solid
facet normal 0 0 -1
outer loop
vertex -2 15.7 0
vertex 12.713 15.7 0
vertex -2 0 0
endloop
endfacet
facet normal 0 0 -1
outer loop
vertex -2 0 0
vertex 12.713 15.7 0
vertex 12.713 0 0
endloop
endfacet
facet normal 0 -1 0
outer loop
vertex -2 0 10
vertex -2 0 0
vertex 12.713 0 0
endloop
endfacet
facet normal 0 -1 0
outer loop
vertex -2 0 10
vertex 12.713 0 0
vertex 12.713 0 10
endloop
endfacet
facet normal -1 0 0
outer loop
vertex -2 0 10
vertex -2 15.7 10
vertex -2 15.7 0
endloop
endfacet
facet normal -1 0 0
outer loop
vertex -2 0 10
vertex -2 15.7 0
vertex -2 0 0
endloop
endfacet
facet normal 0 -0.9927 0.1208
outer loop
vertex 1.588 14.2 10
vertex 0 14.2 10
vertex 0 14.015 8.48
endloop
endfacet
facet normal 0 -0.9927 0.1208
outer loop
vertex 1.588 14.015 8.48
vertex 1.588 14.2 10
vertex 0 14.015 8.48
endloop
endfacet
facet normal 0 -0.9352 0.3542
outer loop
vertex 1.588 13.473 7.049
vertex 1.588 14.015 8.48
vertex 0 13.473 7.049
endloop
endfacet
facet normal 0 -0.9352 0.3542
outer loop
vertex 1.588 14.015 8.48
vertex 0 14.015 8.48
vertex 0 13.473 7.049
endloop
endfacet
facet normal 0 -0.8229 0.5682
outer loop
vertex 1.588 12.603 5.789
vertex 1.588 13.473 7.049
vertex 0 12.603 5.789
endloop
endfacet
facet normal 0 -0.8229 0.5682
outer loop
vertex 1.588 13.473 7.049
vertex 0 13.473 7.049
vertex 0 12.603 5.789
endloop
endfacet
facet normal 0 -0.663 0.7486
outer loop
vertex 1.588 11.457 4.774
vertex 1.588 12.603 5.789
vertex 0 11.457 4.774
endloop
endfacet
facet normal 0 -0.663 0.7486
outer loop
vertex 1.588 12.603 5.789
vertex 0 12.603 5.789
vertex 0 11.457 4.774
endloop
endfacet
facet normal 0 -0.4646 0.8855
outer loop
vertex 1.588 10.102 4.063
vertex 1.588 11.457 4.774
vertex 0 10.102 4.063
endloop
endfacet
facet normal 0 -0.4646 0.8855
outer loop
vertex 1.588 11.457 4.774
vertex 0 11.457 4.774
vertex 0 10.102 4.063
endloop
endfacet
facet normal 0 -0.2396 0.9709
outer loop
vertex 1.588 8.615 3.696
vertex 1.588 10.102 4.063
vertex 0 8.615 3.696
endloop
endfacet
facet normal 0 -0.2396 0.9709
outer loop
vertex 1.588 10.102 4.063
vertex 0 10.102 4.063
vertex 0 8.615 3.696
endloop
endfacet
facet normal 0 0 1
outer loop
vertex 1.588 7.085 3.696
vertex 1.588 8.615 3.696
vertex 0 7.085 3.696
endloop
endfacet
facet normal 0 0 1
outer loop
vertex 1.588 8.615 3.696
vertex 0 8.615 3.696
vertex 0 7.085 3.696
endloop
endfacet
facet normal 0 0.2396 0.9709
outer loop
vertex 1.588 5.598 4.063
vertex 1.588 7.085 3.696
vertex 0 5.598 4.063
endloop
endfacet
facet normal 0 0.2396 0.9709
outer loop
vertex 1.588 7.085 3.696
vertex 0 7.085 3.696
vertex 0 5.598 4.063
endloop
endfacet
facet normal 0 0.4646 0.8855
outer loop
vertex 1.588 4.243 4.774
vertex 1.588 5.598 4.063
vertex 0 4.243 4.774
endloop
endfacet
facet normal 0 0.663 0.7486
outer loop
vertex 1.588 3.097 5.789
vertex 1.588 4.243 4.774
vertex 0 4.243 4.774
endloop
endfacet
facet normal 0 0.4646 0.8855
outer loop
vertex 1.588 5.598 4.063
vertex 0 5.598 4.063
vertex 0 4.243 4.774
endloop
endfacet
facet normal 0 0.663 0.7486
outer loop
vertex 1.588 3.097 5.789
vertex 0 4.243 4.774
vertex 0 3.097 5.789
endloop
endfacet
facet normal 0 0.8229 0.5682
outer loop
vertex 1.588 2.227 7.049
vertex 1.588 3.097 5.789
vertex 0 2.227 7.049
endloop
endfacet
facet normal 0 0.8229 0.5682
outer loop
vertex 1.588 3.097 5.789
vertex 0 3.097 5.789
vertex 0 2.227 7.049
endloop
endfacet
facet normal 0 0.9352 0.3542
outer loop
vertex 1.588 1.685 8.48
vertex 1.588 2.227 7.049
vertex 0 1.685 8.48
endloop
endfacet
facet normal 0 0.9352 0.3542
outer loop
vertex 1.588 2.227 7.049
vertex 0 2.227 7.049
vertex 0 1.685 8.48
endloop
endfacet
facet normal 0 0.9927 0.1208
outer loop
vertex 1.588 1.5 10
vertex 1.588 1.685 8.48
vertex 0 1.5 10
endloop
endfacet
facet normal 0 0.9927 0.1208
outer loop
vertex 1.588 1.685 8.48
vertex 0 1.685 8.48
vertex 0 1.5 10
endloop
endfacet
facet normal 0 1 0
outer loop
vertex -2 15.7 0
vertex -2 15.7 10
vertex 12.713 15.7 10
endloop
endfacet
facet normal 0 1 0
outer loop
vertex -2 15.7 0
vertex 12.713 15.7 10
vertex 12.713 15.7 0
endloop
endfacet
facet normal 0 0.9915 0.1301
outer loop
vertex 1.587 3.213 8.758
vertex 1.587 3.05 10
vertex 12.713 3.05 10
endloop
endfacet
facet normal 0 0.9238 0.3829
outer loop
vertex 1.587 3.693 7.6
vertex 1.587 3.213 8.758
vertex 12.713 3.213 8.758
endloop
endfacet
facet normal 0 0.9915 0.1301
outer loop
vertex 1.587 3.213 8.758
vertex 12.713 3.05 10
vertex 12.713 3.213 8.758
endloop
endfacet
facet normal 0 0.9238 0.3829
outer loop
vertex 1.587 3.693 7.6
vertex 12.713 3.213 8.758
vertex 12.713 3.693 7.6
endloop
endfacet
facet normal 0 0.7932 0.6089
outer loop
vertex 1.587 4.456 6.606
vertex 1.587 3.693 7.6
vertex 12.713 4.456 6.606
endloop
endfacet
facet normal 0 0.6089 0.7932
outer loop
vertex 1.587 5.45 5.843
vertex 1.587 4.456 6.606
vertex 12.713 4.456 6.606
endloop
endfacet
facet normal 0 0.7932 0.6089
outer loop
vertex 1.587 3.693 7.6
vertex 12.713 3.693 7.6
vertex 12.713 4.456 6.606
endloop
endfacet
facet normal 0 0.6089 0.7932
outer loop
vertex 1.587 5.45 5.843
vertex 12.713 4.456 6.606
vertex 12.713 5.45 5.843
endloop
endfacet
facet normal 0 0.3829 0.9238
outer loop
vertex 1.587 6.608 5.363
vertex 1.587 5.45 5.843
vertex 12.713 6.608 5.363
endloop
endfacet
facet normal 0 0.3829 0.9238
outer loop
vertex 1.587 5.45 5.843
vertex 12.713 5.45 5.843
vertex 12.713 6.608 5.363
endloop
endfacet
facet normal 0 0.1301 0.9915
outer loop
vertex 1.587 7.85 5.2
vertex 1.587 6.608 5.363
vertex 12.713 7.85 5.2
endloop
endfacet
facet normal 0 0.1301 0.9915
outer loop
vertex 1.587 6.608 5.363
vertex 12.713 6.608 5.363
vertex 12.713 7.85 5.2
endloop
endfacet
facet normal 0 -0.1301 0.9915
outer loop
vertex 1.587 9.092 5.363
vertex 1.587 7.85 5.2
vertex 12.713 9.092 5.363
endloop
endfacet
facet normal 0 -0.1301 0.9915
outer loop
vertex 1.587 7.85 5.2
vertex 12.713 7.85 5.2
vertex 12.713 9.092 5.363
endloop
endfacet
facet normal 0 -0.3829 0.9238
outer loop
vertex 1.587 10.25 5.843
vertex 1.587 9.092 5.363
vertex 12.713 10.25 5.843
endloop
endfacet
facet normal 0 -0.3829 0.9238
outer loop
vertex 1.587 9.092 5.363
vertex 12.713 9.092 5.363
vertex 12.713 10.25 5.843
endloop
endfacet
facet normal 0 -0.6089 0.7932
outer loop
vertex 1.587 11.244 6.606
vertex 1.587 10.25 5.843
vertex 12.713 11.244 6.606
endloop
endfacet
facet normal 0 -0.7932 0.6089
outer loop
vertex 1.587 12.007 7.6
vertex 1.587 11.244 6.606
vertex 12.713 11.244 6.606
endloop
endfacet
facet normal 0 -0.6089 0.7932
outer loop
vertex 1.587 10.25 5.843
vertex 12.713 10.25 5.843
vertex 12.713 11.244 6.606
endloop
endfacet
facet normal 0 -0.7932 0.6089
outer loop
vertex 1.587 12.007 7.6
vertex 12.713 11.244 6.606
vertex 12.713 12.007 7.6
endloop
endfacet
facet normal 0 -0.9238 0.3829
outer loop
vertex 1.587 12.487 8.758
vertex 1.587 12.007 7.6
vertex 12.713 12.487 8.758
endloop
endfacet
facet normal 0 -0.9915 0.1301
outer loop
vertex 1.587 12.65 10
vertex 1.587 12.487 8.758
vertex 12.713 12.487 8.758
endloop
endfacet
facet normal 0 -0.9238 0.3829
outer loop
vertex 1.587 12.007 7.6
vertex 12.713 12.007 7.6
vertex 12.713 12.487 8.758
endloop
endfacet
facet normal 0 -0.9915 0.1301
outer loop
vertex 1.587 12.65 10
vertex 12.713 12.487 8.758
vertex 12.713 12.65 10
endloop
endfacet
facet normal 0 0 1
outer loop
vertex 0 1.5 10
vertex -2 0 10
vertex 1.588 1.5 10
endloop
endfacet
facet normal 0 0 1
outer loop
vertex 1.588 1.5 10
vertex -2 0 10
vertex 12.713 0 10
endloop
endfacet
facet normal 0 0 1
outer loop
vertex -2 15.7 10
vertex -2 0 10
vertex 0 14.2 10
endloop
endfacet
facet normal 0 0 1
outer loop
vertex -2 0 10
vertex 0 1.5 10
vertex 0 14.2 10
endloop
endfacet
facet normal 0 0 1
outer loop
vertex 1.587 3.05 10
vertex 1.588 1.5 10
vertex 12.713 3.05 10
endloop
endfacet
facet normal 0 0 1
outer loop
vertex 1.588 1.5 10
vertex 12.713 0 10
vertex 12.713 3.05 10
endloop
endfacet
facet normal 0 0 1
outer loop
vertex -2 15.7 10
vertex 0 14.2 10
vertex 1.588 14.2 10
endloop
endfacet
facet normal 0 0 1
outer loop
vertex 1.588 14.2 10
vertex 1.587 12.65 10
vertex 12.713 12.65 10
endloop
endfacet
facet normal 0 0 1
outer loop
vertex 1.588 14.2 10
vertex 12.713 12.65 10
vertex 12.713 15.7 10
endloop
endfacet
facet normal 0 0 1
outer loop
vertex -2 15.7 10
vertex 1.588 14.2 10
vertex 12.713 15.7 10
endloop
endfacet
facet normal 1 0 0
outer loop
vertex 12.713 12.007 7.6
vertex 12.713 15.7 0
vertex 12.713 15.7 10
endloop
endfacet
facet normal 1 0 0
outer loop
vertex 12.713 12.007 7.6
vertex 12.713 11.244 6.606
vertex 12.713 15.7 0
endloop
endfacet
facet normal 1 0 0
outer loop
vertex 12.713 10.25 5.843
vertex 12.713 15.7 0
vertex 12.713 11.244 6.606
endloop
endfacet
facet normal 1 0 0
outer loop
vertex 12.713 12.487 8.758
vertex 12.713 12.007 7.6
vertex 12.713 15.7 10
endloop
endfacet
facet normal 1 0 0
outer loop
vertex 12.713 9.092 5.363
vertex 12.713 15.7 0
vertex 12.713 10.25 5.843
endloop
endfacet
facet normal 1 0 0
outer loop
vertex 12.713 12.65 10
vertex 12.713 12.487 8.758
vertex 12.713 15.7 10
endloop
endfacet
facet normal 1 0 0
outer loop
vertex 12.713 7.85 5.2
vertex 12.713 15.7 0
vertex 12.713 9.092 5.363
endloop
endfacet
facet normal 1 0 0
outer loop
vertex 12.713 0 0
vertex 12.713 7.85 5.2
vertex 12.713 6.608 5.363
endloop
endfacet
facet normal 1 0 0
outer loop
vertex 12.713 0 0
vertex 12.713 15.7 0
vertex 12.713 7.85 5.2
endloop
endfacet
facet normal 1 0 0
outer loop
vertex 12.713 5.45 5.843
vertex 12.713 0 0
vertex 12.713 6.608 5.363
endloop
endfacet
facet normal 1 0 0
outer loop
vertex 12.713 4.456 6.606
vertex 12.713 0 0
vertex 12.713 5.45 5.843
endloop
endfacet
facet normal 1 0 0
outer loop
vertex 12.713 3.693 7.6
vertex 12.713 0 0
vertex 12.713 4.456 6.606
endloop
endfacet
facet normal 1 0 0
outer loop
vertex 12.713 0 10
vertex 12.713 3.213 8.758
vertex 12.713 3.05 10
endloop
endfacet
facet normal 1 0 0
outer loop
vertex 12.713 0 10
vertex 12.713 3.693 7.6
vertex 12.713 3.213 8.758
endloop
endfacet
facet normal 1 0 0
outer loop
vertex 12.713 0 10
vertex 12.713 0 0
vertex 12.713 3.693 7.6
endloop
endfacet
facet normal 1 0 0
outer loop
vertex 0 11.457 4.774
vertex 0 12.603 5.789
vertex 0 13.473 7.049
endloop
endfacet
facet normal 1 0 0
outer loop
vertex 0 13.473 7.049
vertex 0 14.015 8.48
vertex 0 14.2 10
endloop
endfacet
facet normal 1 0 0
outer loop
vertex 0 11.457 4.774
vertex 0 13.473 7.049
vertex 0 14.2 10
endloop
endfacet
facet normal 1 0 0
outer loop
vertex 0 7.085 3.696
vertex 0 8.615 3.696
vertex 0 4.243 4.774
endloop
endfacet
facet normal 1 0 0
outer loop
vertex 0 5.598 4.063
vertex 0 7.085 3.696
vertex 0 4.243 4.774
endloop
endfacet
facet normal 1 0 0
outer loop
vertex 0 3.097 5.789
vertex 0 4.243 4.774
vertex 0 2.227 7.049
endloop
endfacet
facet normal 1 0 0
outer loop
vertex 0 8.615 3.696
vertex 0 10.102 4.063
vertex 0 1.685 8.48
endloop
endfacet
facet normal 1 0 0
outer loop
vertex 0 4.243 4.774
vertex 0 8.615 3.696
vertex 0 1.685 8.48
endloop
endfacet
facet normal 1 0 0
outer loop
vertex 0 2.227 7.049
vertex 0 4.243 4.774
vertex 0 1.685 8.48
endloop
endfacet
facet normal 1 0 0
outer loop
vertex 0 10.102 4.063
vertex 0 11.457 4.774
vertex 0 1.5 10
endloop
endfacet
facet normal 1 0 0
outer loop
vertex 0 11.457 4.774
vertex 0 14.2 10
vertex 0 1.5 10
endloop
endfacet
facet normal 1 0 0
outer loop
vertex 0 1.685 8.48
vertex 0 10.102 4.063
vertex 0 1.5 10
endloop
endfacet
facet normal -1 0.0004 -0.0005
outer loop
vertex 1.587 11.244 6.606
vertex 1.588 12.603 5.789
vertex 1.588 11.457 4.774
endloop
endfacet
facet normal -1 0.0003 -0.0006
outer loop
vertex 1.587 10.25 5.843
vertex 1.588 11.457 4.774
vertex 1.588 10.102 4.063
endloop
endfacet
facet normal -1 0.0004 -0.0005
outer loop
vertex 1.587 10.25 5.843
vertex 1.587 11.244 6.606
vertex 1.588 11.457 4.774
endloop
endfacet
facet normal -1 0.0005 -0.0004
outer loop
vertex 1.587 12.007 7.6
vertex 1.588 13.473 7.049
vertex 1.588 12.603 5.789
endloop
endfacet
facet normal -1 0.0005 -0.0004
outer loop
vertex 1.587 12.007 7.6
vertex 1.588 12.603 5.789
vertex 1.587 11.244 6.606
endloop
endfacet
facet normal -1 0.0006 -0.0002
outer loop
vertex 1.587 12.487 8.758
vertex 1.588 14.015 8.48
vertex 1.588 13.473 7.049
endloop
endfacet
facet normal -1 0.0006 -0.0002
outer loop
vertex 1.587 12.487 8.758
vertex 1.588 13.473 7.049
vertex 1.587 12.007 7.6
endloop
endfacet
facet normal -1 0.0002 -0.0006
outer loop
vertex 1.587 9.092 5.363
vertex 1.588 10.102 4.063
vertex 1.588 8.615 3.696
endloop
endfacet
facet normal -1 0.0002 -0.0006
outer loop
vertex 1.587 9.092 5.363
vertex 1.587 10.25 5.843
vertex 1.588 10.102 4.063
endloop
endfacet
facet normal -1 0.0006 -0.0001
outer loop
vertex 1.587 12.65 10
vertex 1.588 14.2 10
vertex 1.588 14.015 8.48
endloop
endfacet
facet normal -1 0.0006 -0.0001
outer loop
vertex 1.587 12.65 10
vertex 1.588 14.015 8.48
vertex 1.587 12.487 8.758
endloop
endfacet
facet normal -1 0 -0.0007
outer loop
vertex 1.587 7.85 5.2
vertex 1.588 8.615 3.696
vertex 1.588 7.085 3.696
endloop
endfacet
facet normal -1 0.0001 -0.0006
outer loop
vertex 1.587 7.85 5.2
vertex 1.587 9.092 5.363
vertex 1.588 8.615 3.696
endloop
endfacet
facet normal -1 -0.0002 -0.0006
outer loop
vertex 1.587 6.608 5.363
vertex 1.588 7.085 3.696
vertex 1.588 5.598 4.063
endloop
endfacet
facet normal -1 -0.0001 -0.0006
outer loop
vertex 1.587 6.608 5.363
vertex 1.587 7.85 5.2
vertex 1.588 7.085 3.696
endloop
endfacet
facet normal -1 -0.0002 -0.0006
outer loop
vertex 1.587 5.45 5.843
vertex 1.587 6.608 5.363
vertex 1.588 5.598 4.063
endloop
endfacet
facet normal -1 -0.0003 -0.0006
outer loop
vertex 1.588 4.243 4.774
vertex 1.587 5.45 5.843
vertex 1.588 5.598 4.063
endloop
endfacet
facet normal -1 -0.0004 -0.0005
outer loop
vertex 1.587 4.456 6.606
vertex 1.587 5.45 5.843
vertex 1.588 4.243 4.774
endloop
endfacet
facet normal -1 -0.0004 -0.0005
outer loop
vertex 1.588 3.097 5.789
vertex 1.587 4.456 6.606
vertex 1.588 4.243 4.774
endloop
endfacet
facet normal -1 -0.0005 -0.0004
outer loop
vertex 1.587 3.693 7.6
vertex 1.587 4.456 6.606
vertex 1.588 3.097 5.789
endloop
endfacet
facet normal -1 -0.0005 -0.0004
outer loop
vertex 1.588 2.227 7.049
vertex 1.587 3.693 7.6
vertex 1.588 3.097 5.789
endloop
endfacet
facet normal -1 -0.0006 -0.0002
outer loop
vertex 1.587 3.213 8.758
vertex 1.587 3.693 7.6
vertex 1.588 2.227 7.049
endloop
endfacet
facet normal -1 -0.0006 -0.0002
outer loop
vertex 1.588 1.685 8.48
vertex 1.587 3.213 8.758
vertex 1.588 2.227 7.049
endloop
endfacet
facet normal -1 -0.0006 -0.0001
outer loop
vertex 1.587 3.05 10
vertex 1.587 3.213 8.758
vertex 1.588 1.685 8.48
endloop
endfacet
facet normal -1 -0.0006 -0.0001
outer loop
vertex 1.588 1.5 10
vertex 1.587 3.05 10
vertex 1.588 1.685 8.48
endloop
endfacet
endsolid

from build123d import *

# Parameters (mm, degrees)
F1_DEPTH  = 145
F2_W      = 15.7
F2_H      = 15
F3_DEPTH  = 11.463
F4_W      = 15.7
F4_H      = 15
F5_DEPTH  = 11.463
F7_DEPTH  = 25.427
F8_R      = 6.35
F8_R_2    = 4.8005
F9_DEPTH  = 1.5875
F10_R     = 6.35
F11_DEPTH = 1.5875
F12_W     = 129.3
F12_H     = 2.5
F12_H_2   = 15
F13_DEPTH = 25.427
F15_DEPTH = 25.427
F16_W     = 12.713
F16_H     = 10
F17_DEPTH = 15.701
F19_DEPTH = 2


with BuildPart() as f1:
    # F0 (on Front) → F1 (new body)
    with BuildSketch(Plane.XZ):
        Polygon((0, 2.5), (0, 0), (12.713, 0), (25.426, 0), (25.426, 2.5), (13.963, 2.5), (13.963, 17.5), (25.426, 17.5), (25.426, 20), (12.713, 20), (0, 20), (0, 17.5), (11.463, 17.5), (11.463, 2.5), align=None)
    extrude(amount=-F1_DEPTH)

    # F2 (on face) → F3 (join, through all)
    with BuildSketch(Plane.YZ.offset(13.963)):
        with Locations((7.85, 10)):
            Rectangle(F2_W, F2_H)
    extrude(amount=F3_DEPTH)

    # F4 (on face) → F5 (join, through all)
    with BuildSketch(Plane(origin=(11.463, 0, 0), x_dir=(0, -1, 0), z_dir=(-1, 0, 0))):
        with Locations((-7.85, 10)):
            Rectangle(F4_W, F4_H)
    extrude(amount=F5_DEPTH)

    # F6 (on face) → F7 (cut, through all)
    with BuildSketch(Plane.YZ.offset(25.426)):
        with BuildLine():
            Line((3.0495, 10), (12.6505, 10))
            ThreePointArc((12.6505, 10), (7.85, 14.8005), (3.0495, 10))
        make_face()
        with BuildLine():
            ThreePointArc((3.0495, 10), (7.85, 5.1995), (12.6505, 10))
            Line((12.6505, 10), (3.0495, 10))
        make_face()
    extrude(amount=-F7_DEPTH, mode=Mode.SUBTRACT)

    # F8 (on face) → F9 (cut)
    with BuildSketch(Plane.YZ.offset(25.426)):
        with Locations((7.85, 10)):
            Circle(F8_R)
        with Locations((7.85, 10)):
            Circle(F8_R_2, mode=Mode.SUBTRACT)
    extrude(amount=-F9_DEPTH, mode=Mode.SUBTRACT)

    # F10 (on face) → F11 (cut)
    with BuildSketch(Plane(origin=(0, 0, 0), x_dir=(0, -1, 0), z_dir=(-1, 0, 0))):
        with Locations((-7.85, 10)):
            Circle(F10_R)
    extrude(amount=-F11_DEPTH, mode=Mode.SUBTRACT)

    # F12 (on face) → F13 (cut, through all)
    with BuildSketch(Plane.YZ.offset(25.426)):
        with Locations((80.35, 18.75)):
            Rectangle(F12_W, F12_H)
        with Locations((80.35, 10)):
            Rectangle(F12_W, F12_H_2)
        with Locations((80.35, 1.25)):
            Rectangle(F12_W, F12_H)
    extrude(amount=-F13_DEPTH, mode=Mode.SUBTRACT)

    # F14 (on face) → F15 (cut, through all)
    with BuildSketch(Plane(origin=(0, 0, 0), x_dir=(0, -1, 0), z_dir=(-1, 0, 0))):
        with BuildLine():
            ThreePointArc((-14.2, 10), (-7.85, 16.35), (-1.5, 10))
            Line((-1.5, 10), (0, 10))
            Line((0, 10), (0, 20))
            Line((0, 20), (-15.7, 20))
            Line((-15.7, 20), (-15.7, 10))
            Line((-15.7, 10), (-14.2, 10))
        make_face()
        with BuildLine():
            Line((-14.2, 10), (-1.5, 10))
            ThreePointArc((-1.5, 10), (-7.85, 16.35), (-14.2, 10))
        make_face()
    extrude(amount=-F15_DEPTH, mode=Mode.SUBTRACT)

    # F16 (on face) → F17 (cut, through all)
    with BuildSketch(Plane.XZ):
        with Locations((19.0695, 5)):
            Rectangle(F16_W, F16_H)
    extrude(amount=-F17_DEPTH, mode=Mode.SUBTRACT)

    # F18 (on face) → F19 (join)
    with BuildSketch(Plane(origin=(0, 0, 0), x_dir=(0, -1, 0), z_dir=(-1, 0, 0))):
        with BuildLine():
            Line((-14.2, 10), (-15.7, 10))
            Line((-15.7, 10), (-15.7, 0))
            Line((-15.7, 0), (0, 0))
            Line((0, 0), (0, 10))
            Line((0, 10), (-1.5, 10))
            ThreePointArc((-1.5, 10), (-7.85, 3.65), (-14.2, 10))
        make_face()
        with BuildLine():
            Line((-1.5, 10), (-14.2, 10))
            ThreePointArc((-14.2, 10), (-7.85, 3.65), (-1.5, 10))
        make_face()
    extrude(amount=F19_DEPTH)


solid = f1.part
